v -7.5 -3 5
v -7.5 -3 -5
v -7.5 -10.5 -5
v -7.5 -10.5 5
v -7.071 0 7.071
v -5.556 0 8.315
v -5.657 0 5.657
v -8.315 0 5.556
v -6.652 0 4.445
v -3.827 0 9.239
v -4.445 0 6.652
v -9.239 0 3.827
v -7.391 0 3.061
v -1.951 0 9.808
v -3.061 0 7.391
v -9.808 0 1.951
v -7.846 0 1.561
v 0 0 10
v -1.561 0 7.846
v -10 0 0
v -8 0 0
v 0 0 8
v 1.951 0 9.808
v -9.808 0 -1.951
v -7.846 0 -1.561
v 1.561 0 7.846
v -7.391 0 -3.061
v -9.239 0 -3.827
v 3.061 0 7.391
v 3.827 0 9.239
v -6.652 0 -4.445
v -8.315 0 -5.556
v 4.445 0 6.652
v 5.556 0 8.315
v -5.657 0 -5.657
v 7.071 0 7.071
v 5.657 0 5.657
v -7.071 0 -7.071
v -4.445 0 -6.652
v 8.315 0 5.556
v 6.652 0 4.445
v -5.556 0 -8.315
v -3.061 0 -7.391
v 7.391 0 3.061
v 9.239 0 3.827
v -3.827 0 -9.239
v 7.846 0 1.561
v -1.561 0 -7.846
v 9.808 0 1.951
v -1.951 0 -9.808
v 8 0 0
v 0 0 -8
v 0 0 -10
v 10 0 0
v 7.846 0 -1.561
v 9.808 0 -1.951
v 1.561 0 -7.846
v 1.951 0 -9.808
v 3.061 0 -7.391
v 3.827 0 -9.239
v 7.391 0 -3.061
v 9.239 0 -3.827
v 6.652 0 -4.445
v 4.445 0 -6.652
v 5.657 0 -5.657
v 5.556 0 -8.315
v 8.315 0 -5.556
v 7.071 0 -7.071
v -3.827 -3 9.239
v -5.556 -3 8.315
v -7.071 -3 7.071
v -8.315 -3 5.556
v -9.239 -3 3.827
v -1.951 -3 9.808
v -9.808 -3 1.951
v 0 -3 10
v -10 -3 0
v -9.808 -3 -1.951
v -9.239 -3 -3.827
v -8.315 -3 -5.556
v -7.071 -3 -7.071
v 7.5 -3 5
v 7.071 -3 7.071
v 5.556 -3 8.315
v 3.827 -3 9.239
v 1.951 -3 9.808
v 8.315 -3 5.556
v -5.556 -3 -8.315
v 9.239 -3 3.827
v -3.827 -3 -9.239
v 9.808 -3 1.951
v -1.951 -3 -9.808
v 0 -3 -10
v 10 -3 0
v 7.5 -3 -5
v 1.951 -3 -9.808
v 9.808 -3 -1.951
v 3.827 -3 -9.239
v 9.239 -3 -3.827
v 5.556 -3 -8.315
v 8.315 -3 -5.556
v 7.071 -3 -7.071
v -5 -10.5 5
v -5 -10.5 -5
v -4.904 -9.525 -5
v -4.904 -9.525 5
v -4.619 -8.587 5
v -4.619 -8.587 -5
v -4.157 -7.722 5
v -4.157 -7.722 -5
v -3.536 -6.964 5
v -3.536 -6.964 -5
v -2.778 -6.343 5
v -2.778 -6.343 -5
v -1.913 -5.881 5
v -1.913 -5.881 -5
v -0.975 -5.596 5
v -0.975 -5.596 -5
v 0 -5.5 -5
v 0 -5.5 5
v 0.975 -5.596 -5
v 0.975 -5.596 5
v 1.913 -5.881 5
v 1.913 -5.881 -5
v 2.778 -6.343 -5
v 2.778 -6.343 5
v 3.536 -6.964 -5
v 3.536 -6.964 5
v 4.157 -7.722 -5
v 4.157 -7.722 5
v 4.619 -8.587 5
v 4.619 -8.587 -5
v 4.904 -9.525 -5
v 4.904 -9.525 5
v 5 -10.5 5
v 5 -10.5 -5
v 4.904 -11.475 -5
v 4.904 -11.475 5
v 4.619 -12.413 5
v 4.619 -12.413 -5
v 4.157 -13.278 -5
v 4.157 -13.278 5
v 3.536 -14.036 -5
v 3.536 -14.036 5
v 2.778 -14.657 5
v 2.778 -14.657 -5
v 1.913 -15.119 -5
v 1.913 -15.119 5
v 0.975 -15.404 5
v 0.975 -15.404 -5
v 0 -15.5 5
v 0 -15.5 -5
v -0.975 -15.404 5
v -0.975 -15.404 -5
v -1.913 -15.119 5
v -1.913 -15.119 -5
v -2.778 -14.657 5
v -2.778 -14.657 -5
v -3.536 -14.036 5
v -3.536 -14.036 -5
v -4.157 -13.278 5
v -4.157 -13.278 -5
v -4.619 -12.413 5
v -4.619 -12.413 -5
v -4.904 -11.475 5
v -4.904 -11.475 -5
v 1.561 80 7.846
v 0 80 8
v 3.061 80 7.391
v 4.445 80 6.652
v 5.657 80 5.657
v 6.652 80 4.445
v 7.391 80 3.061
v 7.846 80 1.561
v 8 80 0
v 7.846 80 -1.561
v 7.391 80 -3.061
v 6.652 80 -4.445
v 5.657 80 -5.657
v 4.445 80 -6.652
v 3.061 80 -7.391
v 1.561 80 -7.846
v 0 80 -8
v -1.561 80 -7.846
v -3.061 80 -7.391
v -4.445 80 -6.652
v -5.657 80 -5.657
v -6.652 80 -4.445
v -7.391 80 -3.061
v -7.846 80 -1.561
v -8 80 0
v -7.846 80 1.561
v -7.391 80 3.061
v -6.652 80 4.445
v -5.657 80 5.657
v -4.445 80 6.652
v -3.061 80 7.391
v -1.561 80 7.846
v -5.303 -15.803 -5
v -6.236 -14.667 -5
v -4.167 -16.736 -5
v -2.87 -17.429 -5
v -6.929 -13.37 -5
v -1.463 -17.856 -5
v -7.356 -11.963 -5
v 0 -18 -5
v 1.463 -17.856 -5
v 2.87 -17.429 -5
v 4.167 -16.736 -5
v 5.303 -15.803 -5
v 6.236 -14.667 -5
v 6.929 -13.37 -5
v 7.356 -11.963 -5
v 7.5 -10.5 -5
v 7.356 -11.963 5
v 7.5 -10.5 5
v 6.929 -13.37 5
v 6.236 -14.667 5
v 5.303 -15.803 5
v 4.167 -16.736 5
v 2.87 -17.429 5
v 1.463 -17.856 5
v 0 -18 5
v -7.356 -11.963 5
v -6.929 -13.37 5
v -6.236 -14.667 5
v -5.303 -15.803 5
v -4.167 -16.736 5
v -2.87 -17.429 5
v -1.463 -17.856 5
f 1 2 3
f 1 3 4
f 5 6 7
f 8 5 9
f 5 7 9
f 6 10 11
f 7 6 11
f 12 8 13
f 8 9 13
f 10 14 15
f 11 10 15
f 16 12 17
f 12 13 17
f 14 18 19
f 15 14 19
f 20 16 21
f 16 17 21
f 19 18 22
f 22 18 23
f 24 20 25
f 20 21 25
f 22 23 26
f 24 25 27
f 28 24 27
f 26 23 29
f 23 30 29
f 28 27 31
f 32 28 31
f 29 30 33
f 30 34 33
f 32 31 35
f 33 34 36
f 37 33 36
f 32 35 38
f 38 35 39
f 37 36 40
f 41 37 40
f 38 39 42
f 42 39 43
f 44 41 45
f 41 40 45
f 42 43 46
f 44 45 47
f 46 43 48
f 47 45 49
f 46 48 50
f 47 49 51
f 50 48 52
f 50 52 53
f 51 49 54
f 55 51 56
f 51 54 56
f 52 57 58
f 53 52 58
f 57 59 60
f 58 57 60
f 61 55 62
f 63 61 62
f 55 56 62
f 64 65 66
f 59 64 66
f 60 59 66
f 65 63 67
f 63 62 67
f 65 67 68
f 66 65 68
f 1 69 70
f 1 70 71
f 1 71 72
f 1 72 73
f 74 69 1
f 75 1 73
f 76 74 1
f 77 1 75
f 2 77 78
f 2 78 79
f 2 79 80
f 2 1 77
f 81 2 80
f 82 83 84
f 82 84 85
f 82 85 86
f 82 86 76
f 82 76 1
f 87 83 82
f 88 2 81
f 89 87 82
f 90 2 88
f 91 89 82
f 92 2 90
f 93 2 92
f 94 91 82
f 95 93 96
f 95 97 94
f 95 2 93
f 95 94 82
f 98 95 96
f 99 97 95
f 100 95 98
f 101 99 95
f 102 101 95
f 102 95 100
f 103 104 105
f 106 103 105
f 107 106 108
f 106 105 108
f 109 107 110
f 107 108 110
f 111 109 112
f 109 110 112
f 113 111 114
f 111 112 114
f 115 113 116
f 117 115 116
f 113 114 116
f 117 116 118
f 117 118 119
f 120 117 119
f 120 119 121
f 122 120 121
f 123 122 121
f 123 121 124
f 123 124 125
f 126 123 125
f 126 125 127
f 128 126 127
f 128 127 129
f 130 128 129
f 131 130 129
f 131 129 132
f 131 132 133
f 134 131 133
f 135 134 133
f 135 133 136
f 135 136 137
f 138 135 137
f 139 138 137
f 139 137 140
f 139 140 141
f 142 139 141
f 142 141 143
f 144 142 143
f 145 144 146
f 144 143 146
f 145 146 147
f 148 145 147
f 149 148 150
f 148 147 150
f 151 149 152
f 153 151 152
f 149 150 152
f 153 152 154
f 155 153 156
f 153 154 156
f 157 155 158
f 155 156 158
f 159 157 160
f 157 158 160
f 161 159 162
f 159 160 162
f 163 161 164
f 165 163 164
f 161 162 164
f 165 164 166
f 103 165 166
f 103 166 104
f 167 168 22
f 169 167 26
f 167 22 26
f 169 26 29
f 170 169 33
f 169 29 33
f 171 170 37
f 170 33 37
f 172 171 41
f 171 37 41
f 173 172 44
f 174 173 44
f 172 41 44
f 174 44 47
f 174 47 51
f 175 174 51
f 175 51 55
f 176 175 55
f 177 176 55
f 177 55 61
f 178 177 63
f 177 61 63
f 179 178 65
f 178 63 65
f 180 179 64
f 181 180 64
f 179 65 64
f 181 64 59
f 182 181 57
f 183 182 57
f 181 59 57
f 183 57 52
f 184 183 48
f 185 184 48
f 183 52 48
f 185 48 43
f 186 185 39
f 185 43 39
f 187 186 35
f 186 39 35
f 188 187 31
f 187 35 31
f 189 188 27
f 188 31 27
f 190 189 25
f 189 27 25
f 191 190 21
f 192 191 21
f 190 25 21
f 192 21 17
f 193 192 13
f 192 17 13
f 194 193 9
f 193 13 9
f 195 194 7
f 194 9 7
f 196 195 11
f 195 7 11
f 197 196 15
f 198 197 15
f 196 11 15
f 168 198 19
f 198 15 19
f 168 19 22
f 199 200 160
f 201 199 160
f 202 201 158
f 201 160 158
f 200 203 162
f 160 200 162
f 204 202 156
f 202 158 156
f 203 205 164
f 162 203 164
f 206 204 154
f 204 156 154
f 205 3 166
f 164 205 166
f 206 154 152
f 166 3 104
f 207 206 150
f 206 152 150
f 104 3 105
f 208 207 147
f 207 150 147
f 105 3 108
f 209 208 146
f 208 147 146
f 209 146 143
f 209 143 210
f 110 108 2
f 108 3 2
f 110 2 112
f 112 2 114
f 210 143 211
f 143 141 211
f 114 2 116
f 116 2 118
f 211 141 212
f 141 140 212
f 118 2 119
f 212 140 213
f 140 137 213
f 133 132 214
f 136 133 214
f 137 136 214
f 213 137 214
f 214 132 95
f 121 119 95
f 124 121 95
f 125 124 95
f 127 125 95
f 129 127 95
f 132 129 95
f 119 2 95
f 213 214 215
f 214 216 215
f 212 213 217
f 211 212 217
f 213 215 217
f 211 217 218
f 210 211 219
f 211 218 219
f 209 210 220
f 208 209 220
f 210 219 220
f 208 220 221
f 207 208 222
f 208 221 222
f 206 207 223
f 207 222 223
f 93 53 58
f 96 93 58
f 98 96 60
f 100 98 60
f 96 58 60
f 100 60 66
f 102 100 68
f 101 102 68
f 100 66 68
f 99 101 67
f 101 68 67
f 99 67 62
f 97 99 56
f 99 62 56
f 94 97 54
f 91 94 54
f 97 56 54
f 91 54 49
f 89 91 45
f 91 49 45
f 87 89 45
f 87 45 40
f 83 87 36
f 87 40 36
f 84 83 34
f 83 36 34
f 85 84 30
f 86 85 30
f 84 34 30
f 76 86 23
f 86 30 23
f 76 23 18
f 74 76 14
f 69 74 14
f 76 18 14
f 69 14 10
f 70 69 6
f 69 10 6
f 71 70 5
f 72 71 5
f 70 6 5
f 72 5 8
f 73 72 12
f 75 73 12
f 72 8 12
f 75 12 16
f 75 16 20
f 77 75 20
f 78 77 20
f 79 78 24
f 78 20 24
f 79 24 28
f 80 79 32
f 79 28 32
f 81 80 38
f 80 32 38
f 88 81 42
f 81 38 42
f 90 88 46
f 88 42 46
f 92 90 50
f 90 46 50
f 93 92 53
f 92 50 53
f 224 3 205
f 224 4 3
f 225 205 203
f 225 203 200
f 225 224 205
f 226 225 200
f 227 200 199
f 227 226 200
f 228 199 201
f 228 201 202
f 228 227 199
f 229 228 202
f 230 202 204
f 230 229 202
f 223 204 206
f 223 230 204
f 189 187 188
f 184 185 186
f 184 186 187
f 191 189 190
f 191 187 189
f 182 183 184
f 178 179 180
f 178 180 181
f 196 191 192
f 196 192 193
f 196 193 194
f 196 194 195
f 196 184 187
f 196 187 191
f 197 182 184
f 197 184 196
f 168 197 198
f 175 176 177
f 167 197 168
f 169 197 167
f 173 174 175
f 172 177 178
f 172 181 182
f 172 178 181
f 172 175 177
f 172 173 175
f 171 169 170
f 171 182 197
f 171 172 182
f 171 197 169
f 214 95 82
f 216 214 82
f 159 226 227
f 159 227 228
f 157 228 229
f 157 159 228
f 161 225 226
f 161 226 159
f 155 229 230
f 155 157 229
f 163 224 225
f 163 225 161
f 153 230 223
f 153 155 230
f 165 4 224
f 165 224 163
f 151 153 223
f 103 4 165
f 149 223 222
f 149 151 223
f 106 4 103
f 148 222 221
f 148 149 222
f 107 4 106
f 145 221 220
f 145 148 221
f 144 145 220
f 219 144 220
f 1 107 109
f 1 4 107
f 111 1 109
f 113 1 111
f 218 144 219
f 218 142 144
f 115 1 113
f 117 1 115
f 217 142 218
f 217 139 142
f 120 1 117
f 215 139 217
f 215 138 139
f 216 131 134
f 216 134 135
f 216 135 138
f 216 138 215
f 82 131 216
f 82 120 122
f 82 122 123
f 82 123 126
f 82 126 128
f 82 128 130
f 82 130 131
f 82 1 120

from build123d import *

# Parameters (mm, degrees)
SKETCH1_R           = 8
BOSS_EXTRUDE1_DEPTH = 80
SKETCH2_R           = 10
BOSS_EXTRUDE2_DEPTH = 3
SKETCH3_W           = 15
SKETCH3_H           = 10
BOSS_EXTRUDE3_DEPTH = 15
SKETCH4_R           = 5
CUT_EXTRUDE1_DEPTH  = 15
FILLET1_R           = 7.5


with BuildPart() as part:
    # Sketch1 → Boss-Extrude1 (new body)
    with BuildSketch(Plane(origin=(0, 0, 0), x_dir=(1, 0, 0), z_dir=(0, 1, 0))):
        with Locations(Location((0, 0, 0), (0, 0, 270))):
            Circle(SKETCH1_R)
    extrude(amount=BOSS_EXTRUDE1_DEPTH)

    # Sketch2 → Boss-Extrude2 (add)
    with BuildSketch(Plane.XZ):
        with Locations(Location((0, 0, 0), (0, 0, 270))):
            Circle(SKETCH2_R)
    extrude(amount=BOSS_EXTRUDE2_DEPTH)

    # Sketch3 → Boss-Extrude3 (add)
    with BuildSketch(Plane.XZ.offset(3)):
        Rectangle(SKETCH3_W, SKETCH3_H)
    extrude(amount=BOSS_EXTRUDE3_DEPTH)

    # Sketch4 → Cut-Extrude1 (cut)
    with BuildSketch(Plane(origin=(0, 0, -5), x_dir=(-1, 0, 0), z_dir=(0, 0, -1))):
        with Locations((0, -10.5)):
            Circle(SKETCH4_R)
    extrude(amount=-CUT_EXTRUDE1_DEPTH, mode=Mode.SUBTRACT)

    # Fillet1
    fillet1_edges = [part.edges().sort_by_distance(p)[0] for p in [
        (-7.5, -18, 0),
        (7.5, -18, 0),
    ]]
    fillet(fillet1_edges, radius=FILLET1_R - 0.0001)  # a hair under: the kernel refuses the full size


solid = part.part
